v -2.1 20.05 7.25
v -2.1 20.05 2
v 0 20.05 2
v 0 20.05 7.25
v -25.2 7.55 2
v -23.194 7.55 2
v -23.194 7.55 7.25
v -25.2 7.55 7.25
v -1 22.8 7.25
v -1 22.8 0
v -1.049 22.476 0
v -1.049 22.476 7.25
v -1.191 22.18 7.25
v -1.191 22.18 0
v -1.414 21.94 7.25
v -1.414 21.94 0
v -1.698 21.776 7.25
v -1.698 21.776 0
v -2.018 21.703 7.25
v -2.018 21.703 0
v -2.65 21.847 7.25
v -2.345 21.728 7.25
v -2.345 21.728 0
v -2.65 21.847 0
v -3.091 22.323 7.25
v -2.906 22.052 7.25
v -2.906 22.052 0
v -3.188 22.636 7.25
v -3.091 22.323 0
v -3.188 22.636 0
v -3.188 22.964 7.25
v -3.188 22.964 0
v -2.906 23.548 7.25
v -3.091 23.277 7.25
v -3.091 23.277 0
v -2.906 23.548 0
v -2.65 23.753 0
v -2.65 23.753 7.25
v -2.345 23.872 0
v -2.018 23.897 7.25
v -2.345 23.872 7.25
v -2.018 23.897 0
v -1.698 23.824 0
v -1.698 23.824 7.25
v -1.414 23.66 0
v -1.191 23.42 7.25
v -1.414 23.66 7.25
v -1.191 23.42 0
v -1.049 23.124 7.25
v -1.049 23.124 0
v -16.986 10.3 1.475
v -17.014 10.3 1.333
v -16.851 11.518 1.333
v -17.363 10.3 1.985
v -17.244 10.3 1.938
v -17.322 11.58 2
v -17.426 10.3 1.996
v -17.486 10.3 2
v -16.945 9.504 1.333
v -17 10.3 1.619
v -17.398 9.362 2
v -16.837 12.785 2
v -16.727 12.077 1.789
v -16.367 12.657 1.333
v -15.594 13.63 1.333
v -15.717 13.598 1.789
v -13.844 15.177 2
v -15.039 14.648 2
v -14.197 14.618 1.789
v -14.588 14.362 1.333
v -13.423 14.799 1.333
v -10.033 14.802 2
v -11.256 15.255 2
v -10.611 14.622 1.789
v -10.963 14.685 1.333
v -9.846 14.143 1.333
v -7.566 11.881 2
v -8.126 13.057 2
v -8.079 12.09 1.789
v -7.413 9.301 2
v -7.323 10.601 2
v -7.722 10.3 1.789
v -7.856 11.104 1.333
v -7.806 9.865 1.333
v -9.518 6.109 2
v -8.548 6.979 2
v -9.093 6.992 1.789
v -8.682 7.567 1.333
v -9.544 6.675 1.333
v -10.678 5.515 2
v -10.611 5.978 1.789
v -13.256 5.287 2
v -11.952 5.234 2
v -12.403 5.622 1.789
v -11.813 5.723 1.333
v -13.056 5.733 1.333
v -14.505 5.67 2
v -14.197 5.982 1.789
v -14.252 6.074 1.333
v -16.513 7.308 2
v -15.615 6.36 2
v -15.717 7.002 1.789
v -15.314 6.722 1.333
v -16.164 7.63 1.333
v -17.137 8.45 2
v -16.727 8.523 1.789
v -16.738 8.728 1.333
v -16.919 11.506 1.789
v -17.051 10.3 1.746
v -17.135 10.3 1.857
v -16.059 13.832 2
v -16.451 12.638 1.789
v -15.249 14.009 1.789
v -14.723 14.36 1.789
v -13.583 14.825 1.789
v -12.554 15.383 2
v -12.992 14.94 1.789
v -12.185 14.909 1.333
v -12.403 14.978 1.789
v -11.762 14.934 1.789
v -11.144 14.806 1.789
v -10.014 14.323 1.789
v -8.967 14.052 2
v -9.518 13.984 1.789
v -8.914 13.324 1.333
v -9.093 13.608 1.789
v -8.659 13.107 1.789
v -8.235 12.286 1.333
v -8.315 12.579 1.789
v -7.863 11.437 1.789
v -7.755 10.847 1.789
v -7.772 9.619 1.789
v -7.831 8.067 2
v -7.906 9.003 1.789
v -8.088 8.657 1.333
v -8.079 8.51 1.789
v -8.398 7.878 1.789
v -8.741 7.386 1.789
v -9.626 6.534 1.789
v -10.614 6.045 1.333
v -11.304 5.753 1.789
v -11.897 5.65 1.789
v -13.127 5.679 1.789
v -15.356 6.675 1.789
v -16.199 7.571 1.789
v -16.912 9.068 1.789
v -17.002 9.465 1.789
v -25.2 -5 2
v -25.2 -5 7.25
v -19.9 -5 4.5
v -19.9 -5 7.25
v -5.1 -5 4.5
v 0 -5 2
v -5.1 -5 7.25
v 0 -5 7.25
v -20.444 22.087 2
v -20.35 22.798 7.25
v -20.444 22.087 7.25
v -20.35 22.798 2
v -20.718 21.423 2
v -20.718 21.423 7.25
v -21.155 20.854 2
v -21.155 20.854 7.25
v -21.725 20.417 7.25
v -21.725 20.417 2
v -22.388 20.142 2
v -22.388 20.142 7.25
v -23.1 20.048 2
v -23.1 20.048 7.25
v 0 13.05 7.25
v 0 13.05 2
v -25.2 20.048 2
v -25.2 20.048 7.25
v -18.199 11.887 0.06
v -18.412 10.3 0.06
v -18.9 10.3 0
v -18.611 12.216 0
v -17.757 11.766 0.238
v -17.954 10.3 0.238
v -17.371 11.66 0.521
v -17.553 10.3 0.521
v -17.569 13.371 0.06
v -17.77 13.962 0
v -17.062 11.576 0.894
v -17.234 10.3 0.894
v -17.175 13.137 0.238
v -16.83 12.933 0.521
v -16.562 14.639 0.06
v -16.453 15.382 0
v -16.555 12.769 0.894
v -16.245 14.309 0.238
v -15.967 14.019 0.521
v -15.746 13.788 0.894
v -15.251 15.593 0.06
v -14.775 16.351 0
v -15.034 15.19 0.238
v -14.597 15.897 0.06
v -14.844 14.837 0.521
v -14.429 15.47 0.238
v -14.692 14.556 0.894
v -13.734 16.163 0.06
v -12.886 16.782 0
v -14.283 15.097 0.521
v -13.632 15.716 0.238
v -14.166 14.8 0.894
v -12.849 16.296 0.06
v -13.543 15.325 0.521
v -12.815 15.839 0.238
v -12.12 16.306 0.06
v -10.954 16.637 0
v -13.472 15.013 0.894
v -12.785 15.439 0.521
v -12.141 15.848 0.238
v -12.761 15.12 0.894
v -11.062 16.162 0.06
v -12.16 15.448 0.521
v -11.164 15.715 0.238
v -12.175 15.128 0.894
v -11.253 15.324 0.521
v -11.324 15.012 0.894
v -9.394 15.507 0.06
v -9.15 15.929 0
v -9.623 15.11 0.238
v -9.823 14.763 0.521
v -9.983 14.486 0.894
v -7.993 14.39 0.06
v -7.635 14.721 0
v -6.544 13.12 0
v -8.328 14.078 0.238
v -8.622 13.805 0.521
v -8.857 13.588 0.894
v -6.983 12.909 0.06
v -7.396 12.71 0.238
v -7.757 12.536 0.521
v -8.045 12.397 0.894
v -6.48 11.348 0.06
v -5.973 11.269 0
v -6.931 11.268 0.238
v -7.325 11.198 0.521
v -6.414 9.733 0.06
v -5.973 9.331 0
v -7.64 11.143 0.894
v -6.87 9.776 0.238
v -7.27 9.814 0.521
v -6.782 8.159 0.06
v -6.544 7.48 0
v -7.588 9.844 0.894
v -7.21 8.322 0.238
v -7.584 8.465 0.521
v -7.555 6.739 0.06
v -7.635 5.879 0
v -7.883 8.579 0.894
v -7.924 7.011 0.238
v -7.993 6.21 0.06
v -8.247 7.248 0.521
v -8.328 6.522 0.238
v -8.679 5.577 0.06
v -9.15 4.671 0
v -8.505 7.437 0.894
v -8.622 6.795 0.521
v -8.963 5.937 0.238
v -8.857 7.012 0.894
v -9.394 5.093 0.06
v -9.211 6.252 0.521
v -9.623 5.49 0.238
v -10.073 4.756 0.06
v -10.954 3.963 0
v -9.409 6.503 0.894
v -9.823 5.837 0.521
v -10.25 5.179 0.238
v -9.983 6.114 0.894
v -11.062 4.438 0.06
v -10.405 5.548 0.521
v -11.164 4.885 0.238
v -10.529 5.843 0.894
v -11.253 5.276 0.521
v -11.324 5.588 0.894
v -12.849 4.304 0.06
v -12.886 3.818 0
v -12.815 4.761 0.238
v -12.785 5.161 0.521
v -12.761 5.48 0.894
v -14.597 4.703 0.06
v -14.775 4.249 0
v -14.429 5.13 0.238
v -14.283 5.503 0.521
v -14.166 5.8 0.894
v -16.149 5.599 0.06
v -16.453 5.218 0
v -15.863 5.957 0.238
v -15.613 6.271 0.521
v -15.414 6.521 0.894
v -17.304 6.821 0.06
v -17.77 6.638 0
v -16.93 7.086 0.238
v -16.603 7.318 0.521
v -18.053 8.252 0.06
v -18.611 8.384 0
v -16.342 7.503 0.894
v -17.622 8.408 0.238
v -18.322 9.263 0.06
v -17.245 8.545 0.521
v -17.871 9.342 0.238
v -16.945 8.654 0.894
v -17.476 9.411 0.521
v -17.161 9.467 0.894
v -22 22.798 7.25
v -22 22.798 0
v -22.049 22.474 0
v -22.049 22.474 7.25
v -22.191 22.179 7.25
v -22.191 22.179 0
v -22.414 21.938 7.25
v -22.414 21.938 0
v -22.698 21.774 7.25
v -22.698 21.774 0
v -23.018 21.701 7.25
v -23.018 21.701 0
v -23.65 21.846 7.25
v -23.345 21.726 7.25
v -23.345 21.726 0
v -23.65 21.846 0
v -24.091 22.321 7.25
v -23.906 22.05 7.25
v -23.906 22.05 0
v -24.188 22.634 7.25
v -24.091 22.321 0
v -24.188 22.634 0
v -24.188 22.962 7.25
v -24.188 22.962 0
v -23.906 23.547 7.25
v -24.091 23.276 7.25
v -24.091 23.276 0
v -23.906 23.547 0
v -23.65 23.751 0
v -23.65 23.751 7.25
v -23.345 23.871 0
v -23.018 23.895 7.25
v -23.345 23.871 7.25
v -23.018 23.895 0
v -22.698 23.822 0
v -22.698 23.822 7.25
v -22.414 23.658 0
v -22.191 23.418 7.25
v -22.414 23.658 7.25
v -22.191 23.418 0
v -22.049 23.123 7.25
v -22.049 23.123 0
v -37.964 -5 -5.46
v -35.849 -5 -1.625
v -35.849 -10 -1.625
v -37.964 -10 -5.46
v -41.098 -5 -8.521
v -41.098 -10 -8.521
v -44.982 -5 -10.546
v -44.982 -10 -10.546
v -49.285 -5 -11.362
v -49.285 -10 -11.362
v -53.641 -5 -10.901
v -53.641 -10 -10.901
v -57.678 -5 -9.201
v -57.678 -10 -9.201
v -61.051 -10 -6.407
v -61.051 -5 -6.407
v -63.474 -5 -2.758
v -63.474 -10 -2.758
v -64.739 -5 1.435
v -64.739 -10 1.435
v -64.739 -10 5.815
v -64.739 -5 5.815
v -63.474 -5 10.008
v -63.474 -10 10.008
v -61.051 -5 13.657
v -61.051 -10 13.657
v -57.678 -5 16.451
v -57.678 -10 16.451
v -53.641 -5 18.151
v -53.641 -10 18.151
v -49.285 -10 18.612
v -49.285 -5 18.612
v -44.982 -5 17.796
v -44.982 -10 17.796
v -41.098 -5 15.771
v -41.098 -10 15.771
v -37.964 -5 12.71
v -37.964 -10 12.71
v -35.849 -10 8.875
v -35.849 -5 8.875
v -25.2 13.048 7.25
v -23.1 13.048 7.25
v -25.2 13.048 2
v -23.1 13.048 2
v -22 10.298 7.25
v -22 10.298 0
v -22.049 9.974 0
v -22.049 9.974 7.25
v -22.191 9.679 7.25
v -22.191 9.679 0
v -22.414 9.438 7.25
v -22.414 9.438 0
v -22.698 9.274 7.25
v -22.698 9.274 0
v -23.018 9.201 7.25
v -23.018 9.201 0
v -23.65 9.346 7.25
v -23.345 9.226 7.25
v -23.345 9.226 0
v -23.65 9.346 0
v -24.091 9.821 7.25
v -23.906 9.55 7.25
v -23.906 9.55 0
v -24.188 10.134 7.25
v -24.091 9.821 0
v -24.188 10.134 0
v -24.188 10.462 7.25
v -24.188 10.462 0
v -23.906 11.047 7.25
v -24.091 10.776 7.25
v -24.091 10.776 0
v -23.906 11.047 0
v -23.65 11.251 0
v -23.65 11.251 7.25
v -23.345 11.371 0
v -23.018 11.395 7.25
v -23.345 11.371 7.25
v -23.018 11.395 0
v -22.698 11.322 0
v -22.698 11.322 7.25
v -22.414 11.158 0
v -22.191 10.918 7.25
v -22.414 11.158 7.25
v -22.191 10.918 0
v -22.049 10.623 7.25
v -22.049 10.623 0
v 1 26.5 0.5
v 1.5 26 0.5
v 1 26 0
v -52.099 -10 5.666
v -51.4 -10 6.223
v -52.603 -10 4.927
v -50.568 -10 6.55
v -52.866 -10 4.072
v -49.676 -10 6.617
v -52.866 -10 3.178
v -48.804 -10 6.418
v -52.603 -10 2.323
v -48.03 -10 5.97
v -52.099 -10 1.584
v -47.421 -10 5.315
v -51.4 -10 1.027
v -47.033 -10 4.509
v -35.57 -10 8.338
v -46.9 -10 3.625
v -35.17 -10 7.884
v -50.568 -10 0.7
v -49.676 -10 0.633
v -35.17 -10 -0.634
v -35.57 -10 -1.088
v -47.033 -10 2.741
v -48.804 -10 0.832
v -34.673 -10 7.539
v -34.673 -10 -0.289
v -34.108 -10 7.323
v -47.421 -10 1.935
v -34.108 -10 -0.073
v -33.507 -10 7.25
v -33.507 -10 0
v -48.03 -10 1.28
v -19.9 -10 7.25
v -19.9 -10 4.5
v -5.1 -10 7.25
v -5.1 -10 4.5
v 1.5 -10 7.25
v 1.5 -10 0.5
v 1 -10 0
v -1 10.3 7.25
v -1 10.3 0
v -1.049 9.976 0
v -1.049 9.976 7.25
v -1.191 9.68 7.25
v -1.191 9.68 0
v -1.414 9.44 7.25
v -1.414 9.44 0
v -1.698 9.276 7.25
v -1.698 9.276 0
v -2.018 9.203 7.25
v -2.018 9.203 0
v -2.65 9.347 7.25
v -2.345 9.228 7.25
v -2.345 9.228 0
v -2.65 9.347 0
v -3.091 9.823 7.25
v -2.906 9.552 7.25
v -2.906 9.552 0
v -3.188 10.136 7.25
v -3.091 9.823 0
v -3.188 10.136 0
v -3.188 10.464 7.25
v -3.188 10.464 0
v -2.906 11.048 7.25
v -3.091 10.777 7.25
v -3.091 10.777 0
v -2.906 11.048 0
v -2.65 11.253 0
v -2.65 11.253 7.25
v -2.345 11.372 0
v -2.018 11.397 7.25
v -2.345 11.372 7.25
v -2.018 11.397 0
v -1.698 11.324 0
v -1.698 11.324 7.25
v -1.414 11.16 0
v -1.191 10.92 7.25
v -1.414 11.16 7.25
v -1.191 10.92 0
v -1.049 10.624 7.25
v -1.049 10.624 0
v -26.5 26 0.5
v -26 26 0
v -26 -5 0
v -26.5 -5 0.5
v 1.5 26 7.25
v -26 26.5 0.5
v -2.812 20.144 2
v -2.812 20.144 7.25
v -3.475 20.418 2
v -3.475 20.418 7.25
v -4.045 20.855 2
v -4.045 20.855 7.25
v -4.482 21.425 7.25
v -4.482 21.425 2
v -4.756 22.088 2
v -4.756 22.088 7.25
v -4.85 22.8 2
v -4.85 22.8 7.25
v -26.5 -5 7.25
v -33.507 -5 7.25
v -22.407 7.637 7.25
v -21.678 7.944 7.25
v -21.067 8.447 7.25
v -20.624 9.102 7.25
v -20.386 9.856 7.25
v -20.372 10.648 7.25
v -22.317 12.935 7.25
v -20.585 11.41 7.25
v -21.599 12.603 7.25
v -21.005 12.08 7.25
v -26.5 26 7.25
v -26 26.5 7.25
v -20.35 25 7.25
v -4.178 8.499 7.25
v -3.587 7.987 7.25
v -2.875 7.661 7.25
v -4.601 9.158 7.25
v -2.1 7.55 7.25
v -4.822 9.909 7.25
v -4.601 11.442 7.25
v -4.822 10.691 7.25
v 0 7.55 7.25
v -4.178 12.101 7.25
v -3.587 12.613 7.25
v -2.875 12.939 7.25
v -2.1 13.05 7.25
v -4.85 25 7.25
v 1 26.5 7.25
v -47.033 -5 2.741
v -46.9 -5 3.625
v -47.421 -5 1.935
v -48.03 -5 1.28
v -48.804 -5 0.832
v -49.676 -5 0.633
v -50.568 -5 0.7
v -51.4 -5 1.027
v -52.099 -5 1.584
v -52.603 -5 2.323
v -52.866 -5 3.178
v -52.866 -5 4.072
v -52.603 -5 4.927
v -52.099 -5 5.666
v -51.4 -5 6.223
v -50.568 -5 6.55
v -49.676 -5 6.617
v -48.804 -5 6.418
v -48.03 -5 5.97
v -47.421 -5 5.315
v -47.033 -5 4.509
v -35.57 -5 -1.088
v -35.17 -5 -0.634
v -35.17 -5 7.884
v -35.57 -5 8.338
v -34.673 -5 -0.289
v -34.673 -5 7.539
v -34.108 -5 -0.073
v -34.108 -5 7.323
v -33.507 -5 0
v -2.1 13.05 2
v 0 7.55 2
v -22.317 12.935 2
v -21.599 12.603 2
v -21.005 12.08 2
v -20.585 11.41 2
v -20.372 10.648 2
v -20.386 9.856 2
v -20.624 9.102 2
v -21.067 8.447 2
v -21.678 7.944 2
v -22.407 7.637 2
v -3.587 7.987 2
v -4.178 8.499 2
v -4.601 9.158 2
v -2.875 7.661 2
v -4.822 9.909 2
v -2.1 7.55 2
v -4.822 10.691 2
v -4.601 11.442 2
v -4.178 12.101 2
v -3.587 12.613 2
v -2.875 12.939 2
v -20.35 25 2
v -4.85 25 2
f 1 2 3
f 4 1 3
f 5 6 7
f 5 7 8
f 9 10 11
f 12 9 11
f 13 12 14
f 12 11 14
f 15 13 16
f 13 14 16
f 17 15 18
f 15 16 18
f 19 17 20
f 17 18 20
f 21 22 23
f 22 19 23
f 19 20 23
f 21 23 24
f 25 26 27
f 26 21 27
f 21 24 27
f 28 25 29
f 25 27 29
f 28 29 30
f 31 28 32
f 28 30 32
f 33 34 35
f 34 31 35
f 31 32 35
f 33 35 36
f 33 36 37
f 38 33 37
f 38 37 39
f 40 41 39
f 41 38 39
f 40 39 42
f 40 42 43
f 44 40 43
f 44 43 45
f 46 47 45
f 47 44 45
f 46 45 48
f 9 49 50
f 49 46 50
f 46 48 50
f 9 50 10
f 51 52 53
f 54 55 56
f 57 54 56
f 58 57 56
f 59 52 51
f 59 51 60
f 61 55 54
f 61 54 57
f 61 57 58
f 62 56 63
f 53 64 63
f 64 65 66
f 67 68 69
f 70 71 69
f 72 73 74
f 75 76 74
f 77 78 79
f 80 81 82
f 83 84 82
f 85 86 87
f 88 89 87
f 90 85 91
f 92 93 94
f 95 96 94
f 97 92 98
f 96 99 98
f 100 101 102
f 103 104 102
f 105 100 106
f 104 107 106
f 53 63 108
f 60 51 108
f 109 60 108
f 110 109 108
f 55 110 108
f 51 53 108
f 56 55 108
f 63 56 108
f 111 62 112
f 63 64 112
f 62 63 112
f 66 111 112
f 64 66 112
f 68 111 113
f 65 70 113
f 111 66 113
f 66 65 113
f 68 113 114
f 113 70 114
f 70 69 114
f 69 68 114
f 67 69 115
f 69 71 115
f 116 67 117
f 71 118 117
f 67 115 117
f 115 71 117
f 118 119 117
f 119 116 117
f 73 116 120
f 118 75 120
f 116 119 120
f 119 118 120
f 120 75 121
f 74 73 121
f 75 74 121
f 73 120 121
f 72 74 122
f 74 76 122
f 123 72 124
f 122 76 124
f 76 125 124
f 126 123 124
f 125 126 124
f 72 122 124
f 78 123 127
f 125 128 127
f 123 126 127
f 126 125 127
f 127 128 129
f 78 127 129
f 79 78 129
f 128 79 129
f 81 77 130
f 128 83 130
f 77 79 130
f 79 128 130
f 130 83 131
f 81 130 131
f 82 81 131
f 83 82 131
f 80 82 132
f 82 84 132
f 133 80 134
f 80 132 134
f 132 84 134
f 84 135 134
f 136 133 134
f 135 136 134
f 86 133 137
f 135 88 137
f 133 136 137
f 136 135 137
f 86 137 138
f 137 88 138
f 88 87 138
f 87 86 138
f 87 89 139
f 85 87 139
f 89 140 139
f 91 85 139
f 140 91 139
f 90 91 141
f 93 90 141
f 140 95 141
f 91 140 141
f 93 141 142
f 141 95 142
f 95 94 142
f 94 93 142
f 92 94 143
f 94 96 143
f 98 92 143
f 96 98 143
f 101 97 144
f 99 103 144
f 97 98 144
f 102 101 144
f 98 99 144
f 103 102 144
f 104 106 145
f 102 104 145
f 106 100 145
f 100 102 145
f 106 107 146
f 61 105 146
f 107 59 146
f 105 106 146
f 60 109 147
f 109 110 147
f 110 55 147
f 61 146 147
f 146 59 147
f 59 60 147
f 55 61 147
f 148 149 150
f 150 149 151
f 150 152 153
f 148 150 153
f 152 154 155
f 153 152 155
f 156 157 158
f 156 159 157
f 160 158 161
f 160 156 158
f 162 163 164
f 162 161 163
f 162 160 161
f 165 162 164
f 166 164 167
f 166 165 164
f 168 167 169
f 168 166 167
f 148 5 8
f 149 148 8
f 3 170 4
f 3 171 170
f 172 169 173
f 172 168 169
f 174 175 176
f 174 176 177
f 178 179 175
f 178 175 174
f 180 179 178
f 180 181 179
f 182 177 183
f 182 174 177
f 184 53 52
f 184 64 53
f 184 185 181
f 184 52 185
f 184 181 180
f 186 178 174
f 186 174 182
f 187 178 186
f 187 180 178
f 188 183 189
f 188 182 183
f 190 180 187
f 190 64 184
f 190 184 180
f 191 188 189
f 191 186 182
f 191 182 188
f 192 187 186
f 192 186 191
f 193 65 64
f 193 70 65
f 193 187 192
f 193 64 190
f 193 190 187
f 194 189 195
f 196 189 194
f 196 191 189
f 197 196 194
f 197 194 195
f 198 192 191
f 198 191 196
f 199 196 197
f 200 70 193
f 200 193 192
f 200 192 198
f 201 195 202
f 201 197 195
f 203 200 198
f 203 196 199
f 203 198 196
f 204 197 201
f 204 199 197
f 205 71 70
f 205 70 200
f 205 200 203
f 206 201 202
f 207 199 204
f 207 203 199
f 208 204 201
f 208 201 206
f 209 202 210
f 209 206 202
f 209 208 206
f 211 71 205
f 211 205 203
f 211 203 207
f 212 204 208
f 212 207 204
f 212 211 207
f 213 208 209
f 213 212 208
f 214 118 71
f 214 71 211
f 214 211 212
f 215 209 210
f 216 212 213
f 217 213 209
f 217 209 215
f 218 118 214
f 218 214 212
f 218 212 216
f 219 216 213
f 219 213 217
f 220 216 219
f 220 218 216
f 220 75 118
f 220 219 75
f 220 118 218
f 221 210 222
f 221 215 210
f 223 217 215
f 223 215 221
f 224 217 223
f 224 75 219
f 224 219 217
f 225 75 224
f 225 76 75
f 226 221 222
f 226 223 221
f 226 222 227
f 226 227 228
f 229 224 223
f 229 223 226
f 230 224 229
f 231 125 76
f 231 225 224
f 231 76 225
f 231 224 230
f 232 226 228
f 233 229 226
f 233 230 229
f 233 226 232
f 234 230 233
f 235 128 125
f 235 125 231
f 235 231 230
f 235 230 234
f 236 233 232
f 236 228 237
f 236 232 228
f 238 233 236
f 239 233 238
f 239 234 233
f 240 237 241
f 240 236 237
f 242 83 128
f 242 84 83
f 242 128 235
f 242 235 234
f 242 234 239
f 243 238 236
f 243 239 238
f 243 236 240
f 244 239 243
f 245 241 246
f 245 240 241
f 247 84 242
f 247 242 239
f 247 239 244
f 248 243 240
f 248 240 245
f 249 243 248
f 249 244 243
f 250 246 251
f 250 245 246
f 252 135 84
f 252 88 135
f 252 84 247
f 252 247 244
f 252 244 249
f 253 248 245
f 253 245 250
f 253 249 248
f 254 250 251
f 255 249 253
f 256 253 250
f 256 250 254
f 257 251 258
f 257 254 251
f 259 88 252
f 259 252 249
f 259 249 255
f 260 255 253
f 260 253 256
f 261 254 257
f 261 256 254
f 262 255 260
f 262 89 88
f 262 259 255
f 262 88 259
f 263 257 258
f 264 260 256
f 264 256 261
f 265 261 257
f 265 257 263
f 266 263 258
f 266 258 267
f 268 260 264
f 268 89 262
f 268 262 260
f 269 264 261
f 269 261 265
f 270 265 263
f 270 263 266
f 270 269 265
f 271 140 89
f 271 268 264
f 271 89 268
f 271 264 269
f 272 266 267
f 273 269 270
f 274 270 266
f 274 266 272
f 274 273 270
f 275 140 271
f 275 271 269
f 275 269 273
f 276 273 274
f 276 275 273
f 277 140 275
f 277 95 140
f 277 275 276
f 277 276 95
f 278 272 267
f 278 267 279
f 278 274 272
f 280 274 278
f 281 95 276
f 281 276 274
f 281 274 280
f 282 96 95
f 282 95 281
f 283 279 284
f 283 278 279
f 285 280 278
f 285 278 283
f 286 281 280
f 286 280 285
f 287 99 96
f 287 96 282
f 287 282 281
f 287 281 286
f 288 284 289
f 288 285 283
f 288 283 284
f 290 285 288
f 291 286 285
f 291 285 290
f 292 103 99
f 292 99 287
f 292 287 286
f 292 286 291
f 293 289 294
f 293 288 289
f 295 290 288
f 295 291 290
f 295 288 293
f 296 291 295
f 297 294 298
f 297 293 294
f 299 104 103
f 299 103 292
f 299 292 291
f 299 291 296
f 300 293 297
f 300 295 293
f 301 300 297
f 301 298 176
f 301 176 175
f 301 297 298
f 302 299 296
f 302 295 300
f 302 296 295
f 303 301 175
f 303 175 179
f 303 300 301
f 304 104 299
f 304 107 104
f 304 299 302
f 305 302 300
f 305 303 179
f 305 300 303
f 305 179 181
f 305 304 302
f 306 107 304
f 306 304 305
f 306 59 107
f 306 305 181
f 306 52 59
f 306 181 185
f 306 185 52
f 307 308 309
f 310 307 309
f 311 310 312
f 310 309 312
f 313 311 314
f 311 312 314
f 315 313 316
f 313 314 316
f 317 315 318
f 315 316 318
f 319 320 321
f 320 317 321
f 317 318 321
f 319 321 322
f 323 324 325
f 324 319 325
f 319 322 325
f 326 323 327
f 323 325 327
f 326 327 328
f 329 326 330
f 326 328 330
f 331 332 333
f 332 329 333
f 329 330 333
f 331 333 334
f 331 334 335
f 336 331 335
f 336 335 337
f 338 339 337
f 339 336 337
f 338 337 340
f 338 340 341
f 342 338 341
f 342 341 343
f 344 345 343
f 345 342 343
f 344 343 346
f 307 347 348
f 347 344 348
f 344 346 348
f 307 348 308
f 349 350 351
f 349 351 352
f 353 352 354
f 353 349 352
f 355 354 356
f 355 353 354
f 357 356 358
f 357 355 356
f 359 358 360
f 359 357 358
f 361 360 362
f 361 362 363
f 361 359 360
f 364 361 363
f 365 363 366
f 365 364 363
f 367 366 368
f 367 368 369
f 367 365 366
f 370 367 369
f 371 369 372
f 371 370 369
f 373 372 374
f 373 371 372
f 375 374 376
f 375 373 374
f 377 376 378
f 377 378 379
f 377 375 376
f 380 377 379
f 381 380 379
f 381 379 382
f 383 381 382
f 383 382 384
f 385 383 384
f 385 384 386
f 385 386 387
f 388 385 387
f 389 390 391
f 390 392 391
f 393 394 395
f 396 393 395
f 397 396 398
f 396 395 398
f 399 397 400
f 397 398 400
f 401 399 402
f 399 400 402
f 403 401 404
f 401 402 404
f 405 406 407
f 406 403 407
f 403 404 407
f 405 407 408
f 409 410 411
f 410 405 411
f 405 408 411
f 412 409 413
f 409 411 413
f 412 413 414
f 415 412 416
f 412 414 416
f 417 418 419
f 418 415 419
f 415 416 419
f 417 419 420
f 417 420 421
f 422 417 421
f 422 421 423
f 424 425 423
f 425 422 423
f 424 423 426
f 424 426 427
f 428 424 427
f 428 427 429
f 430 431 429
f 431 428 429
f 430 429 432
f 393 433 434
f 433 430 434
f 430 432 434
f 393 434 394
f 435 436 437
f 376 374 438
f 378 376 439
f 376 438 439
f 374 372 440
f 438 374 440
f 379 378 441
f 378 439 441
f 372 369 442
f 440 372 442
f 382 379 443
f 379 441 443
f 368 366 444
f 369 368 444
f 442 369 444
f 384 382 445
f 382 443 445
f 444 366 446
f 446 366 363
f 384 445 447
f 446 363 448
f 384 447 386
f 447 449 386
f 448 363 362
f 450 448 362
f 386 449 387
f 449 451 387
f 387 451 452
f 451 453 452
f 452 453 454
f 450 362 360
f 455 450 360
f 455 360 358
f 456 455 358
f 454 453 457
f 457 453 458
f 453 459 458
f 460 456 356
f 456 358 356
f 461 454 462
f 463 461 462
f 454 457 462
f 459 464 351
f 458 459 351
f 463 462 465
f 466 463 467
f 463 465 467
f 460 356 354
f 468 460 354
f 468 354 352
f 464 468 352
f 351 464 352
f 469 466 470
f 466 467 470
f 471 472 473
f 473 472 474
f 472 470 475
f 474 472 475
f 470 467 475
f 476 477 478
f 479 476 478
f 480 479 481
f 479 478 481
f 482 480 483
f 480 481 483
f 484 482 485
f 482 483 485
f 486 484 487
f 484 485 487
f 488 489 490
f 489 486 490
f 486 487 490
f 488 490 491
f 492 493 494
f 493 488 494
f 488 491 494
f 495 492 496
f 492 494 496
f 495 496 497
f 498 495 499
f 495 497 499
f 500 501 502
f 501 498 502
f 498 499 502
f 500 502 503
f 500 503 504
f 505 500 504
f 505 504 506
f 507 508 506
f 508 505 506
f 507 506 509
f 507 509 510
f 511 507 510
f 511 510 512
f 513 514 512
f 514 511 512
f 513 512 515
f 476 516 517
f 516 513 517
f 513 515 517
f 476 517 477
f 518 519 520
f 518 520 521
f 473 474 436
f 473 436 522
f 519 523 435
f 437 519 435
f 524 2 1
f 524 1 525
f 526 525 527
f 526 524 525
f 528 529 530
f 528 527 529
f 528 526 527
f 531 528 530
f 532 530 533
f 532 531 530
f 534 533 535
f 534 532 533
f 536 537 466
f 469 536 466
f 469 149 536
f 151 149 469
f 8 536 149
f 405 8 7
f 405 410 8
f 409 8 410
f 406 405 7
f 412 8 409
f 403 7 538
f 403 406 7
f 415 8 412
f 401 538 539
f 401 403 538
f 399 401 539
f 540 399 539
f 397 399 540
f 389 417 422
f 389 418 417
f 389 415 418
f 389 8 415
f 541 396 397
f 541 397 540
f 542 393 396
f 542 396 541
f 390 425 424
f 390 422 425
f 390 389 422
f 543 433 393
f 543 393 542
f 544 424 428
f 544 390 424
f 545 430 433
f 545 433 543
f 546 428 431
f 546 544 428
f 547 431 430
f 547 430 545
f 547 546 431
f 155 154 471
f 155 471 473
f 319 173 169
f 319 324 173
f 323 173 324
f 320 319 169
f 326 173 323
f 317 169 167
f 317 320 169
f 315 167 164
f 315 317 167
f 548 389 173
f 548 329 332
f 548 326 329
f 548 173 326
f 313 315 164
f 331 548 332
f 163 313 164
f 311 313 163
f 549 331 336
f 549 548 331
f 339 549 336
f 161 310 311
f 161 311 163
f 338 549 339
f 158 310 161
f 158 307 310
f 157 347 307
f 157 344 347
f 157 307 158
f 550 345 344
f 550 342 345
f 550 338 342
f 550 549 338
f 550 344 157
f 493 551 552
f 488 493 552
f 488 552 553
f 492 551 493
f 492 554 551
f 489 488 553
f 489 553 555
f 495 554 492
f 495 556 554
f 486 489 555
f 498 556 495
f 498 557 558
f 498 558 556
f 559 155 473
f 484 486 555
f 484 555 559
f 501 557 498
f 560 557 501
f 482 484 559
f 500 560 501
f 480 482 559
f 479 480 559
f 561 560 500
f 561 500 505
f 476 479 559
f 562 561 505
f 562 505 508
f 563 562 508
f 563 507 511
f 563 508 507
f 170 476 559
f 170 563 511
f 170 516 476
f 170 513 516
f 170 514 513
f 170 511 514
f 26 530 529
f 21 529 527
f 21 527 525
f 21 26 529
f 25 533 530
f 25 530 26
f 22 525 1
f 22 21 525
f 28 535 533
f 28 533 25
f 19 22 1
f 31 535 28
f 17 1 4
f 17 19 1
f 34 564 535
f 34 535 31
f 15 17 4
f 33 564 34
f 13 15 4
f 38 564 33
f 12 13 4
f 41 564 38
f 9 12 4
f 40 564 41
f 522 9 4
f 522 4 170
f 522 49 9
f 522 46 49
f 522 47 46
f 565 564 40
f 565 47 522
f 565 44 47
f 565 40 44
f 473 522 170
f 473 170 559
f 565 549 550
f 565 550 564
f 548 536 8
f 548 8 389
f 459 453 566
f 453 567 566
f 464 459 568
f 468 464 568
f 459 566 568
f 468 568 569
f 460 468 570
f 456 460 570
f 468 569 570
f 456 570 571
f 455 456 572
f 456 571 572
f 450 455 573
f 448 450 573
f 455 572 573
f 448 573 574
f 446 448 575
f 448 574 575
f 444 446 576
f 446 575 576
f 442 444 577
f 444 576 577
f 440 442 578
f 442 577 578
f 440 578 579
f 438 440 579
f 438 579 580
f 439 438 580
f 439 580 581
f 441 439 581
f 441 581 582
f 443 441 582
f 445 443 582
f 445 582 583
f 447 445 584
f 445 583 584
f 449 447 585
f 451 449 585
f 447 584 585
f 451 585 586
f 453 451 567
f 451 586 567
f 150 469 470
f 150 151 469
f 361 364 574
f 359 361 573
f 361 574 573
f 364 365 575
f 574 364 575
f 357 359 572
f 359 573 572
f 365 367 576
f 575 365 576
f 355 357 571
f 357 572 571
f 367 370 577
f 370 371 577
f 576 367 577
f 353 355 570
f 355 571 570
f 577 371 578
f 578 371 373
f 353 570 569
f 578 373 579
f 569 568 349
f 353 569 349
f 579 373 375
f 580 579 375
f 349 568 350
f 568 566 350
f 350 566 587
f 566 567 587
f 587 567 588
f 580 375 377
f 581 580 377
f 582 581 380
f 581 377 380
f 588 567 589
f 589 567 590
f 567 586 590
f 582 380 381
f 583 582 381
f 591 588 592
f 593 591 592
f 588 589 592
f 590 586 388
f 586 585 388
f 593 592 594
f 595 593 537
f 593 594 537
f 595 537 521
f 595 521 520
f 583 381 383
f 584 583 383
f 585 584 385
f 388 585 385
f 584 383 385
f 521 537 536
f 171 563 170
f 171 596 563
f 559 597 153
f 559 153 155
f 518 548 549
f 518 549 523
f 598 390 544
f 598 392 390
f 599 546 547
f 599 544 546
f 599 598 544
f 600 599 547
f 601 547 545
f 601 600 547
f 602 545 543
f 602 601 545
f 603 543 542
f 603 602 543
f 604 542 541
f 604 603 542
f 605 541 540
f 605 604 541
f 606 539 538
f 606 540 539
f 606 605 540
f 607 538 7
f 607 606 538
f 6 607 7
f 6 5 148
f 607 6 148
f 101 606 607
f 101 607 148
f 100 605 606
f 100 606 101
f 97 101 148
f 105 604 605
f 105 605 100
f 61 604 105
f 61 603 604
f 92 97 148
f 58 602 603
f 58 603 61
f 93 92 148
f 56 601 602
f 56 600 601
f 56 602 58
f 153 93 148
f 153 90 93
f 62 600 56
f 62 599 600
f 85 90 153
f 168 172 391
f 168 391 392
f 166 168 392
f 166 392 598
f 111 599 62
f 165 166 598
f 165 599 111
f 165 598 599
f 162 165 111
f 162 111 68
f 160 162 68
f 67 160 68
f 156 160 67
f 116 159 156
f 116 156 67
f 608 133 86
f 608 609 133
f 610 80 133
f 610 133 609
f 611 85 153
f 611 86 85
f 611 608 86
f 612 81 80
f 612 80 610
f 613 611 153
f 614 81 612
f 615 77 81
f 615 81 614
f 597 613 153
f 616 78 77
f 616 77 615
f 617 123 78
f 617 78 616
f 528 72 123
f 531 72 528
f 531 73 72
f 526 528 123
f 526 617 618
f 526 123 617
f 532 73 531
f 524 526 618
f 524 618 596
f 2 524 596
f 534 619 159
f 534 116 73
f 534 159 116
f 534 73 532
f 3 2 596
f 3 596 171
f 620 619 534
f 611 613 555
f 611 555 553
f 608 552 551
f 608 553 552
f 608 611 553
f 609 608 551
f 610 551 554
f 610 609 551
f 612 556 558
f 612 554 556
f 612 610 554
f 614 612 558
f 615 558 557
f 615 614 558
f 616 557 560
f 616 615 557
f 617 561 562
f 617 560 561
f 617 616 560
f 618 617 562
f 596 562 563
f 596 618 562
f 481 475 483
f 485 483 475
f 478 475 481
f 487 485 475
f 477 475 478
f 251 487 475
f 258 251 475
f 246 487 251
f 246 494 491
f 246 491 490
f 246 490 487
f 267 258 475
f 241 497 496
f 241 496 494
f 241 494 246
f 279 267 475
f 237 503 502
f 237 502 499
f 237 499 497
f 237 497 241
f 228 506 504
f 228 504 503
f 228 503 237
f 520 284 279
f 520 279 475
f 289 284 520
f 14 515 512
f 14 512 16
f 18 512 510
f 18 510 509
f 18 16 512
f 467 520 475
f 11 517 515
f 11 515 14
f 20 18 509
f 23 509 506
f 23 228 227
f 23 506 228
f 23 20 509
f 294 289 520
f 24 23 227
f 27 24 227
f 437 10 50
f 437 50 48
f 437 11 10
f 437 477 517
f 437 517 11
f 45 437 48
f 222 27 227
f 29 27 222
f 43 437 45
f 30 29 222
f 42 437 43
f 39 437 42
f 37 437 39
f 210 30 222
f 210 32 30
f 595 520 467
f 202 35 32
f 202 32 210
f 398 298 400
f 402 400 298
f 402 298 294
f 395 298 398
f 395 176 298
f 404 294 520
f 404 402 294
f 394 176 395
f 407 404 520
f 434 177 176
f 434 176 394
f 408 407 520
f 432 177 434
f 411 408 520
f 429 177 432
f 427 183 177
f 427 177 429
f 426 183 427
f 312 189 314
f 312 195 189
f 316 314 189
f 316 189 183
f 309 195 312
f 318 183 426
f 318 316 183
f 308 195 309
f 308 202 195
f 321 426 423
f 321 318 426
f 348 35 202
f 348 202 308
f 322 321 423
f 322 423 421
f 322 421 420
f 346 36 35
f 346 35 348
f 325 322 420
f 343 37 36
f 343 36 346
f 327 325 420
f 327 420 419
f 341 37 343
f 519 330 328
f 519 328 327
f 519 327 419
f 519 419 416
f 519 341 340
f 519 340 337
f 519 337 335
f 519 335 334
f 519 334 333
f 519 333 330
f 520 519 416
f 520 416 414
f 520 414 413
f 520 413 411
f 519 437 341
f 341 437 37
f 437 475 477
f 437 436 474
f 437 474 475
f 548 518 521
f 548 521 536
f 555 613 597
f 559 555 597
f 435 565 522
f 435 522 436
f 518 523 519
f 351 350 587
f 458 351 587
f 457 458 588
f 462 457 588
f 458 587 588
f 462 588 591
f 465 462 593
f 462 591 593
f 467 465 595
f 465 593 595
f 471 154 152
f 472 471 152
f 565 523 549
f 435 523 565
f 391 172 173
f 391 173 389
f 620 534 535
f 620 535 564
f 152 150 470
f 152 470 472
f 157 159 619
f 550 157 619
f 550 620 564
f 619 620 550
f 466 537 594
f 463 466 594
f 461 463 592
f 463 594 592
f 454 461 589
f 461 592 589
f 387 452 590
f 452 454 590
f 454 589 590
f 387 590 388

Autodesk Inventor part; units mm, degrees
ref_plane "YZ Plane" through (0, 0, 0) normal (1, 0, 0) x (0, 1, 0)
ref_plane "XZ Plane" through (0, 0, 0) normal (0, 1, 0) x (-1, 0, 0)
ref_plane "XY Plane" through (0, 0, 0) normal (0, 0, 1) x (1, 0, 0)
sketch "Sketch1" plane through (0, 0, 0) normal (0, 0, 1) x (1, 0, 0)
  line L0 (0, 0) -> (-25, 0)
  line L1 (-25, 25) -> (0, 25)
  line L2 (0, 25) -> (0, 0)
  circle A0 centre (-23.1, 22.7984) radius 1.1
  circle A1 centre (-2.1, 22.8) radius 1.1
  circle A2 centre (-23.1, 10.2984) radius 1.1
  circle A3 centre (-2.1, 10.3) radius 1.1
  line L3 (-25, 0) -> (-25.2, 0)
  line L4 (-25.2, 0) -> (-25.2, 25)
  line L5 (-25.2, 25) -> (-25, 25)
  dimension "d2" = 2.2
  dimension "d5" = 2.2
  dimension "d7" = 12.5
  dimension "d8" = 2.2
  dimension "d9" = 2.2
  dimension "d14" = 12.5
  dimension "d31" = 2.1
  dimension "d46" = 0.2
  dimension "d47" = 2.1
  dimension "d48" = 2.1
extrude "Base" add sketch "Sketch1" along normal blind 2
sketch "Sketch2" plane through (0, 0, 2) normal (0, 0, 1) x (1, 0, 0)
  line L0 (-26.5, 0) -> (-26.5, 26.5)
  line L1 (-26.5, 26.5) -> (1.5, 26.5)
  line L2 (1.5, 26.5) -> (1.5, 0)
  line L3 (1.5, 0) -> (0, 0)
  line L4 (0, 25) -> (-25.2, 25) projected
  line L5 (0, 0) -> (0, 25) projected
  line L6 (-25.2, 25) -> (-25.2, 0) projected
  line L7 (-25.2, 0) -> (-26.5, 0)
  point P0 (-25, 25)
  point P1 (-25, 0)
  dimension "d16" = 26.5
  dimension "d17" = 28
extrude "Walls" add sketch "Sketch2" along normal blind 5.25 and the other way blind 2
sketch "Sketch3" plane through (0, 0, 2) normal (0, 0, 1) x (1, 0, 0)
  circle A0 centre (-23.1, 10.2984) radius 1.1 projected
  circle A1 centre (-23.1, 10.2984) radius 1.6
  circle A2 centre (-2.1, 10.3) radius 1.1 projected
  circle A3 centre (-2.1, 10.3) radius 1.6
  circle A4 centre (-23.1, 22.7984) radius 1.1 projected
  circle A5 centre (-23.1, 22.7984) radius 1.6
  circle A6 centre (-2.1, 22.8) radius 1.1 projected
  circle A7 centre (-2.1, 22.8) radius 1.6
  point P0 (0, 0)
  dimension "d22" = 3.2
  dimension "d23" = 3.2
  dimension "d24" = 3.2
  dimension "d25" = 3.2
extrude "Spacers" add sketch "Sketch3" along normal up to surface (5.25 mm away)
sketch "Sketch4" plane through (0, 0, 2) normal (0, 0, 1) x (1, 0, 0)
  circle A0 centre (-23.1, 10.2984) radius 1.1 projected
  arc A1 (-23.1938, 7.55) -> (-23.1, 13.0484) centre (-23.1, 10.2984) ccw
  circle A2 centre (-2.1, 10.3) radius 1.1 projected
  arc A3 (-2.1, 13.05) -> (-2.1, 7.55) centre (-2.1, 10.3) ccw
  circle A4 centre (-23.1, 22.7984) radius 1.1 projected
  circle A5 centre (-2.1, 22.8) radius 1.1 projected
  line L0 (-4.85, 22.8) -> (-4.85, 25)
  line L1 (-25.2, 25) -> (0, 25) projected
  line L2 (-2.1, 20.05) -> (0, 20.05)
  line L3 (0, 25) -> (0, 0) projected
  line L4 (-2.1, 13.05) -> (0, 13.05)
  line L5 (-2.1, 7.55) -> (0, 7.55)
  line L6 (-23.1, 13.0484) -> (-25.2, 13.0484)
  line L7 (-23.1938, 7.55) -> (-25, 7.55)
  arc A6 (-4.85, 22.8) -> (-2.1, 20.05) centre (-2.1, 22.8) ccw
  line L8 (-25, 7.55) -> (-25.2, 7.55)
  line L9 (-25.2, 13.0484) -> (-25.2, 13.0484)
  line L10 (-25.2, 25) -> (-25.2, 0) projected
  line L11 (-25.2, 20.0484) -> (-25.2, 20.0484)
  line L12 (-20.35, 22.7984) -> (-20.35, 25.6874)
  line L13 (-23.1, 20.0484) -> (-25.85, 20.0484)
  arc A7 (-23.1, 20.0484) -> (-20.35, 22.7984) centre (-23.1, 22.7984) ccw
  point P0 (-25, 25)
  point P1 (-20.35, 25)
  point P2 (-25.2, 20.0484)
  dimension "d33" = 5.5
  dimension "d34" = 5.5
extrude "Spacer blocks" add sketch "Sketch4" along normal up to surface (5.25 mm away)
sketch "Sketch5" plane through (0, 0, 0) normal (0, 0, -1) x (-1, 0, 0)
  line L0 (-1.5, 26.5) -> (-1.5, 0) projected
  circle A0 centre (12.4, 10.3) radius 4.5
  point P0 (0, 0)
  dimension "d39" = 13.9
  dimension "d40" = 9
extrude "Camera Hole" cut sketch "Sketch5" against normal through all
fillet "Outside Fillet - 2mm" radius 2 1 edges at (-7.9, 10.3, 0)
fillet "Inside Fillet - 1mm" radius 0.5 2 edges at (-7.9, 10.3, 1.9999) (-7.9, 10.3, 2)
chamfer "Chamfer1" distance 0.5 angle 45 5 edges at (1.5, 13.25, 0) (1.5, 26.5, 3.625) (-12.5, 26.5, 0) (-26.5, 26.5, 3.625) (-26.5, 13.25, 0)
sketch "Sketch6" plane through (-25.2, 0, 2) normal (0, -1, 0) x (1, 0, 0)
  line L0 (-0.8, -2) -> (-1.3, -1.5) projected
  line L1 (26.2, -2) -> (-0.8, -2) projected
  line L2 (26.7, -1.5) -> (26.2, -2) projected
  line L3 (26.7, -1.5) -> (26.7, 5.25) projected
  line L4 (25.2, 5.25) -> (26.7, 5.25) projected
  line L5 (25.2, 0) -> (25.2, 5.25) projected
  line L6 (0, 0) -> (25.2, 0) projected
  line L7 (0, 0) -> (0, 5.25) projected
  line L8 (-1.3, 5.25) -> (0, 5.25) projected
  line L9 (-1.3, -1.5) -> (-1.3, 5.25) projected
  point P0 (25.2, -2)
extrude "Bottom Extension" add sketch "Sketch6" along normal blind 5
sketch "Sketch7" plane through (-25.2, -5, 2) normal (0, -1, 0) x (1, 0, 0)
  line L0 (26.7, 5.25) -> (25.2, 5.25) projected
  line L1 (26.7, 5.25) -> (20.1, 5.25)
  line L2 (20.1, 5.25) -> (20.1, -2)
  line L3 (26.7, 5.25) -> (25.2, 5.25) construction
  line L4 (25.2, 5.25) -> (25.2, 0) construction
  line L5 (25.2, 0) -> (0, 0) construction
  line L6 (0, 0) -> (0, 5.25) construction
  line L7 (0, 5.25) -> (-1.3, 5.25) construction
  line L8 (-1.3, 5.25) -> (-1.3, -1.5) construction
  line L9 (-1.3, -1.5) -> (-0.8, -2) construction
  line L10 (-0.8, -2) -> (26.2, -2) construction
  line L11 (26.2, -2) -> (26.7, -1.5) construction
  line L12 (26.7, -1.5) -> (26.7, 5.25) construction
  line L13 (20.1, -2) -> (-0.8, -2)
  line L14 (-1.3, -1.5) -> (-0.8, -2)
  line L15 (-1.3, -1.5) -> (-1.3, 5.25)
  line L16 (-1.3, 5.25) -> (0, 5.25)
  line L17 (0, 5.25) -> (5.3, 5.25)
  line L18 (5.3, 5.25) -> (5.3, 0)
  line L19 (5.3, 0) -> (20.1, 0)
  line L20 (5.3, 0) -> (5.3, 2.5)
  line L21 (5.3, 2.5) -> (20.1, 2.5)
  line L22 (26.7, 5.25) -> (26.7, -1.5)
  line L23 (26.2, -2) -> (26.7, -1.5)
  line L24 (20.1, -2) -> (26.2, -2)
  line L25 (5.3, 5.25) -> (-24.7, 5.25)
  line L26 (-24.7, 5.25) -> (-24.7, -2)
  line L27 (-24.7, -2) -> (-0.8, -2)
  point P0 (25.2, -2)
  point P1 (50.1, 5.25)
  dimension "d54" = 6.6
  dimension "d58" = 5.3
  dimension "d59" = 2.5
  dimension "d68" = 30
extrude "Mounting Arm" add sketch "Sketch7" along normal blind 5
sketch "Sketch10" plane through (-25.2, -5, 2) normal (0, 1, 0) x (1, 0, 0)
  line L0 (-24.7, -5.25) -> (-24.7, 2) projected
  circle A0 centre (-24.7, -1.625) radius 15
  point P0 (25.2, 2)
  dimension "d69" = 30
extrude "Extrusion10" add sketch "Sketch10" against normal blind 5
sketch "Sketch11" plane through (-25.2, -5, 2) normal (0, 1, 0) x (1, 0, 0)
  arc A0 (-10.1446, 2) -> (-10.1446, -5.25) centre (-24.7, -1.625) ccw projected
  circle A1 centre (-24.7, -1.625) radius 3
  point P0 (25.2, 2)
  dimension "d72" = 6
extrude "Extrusion11" cut sketch "Sketch11" against normal through all
fillet "Fillet6" radius 2.5 2 edges at (-35.3446, -7.5, 7.25) (-35.3446, -7.5, 0)
properties part number "Top R_3DPrint"
